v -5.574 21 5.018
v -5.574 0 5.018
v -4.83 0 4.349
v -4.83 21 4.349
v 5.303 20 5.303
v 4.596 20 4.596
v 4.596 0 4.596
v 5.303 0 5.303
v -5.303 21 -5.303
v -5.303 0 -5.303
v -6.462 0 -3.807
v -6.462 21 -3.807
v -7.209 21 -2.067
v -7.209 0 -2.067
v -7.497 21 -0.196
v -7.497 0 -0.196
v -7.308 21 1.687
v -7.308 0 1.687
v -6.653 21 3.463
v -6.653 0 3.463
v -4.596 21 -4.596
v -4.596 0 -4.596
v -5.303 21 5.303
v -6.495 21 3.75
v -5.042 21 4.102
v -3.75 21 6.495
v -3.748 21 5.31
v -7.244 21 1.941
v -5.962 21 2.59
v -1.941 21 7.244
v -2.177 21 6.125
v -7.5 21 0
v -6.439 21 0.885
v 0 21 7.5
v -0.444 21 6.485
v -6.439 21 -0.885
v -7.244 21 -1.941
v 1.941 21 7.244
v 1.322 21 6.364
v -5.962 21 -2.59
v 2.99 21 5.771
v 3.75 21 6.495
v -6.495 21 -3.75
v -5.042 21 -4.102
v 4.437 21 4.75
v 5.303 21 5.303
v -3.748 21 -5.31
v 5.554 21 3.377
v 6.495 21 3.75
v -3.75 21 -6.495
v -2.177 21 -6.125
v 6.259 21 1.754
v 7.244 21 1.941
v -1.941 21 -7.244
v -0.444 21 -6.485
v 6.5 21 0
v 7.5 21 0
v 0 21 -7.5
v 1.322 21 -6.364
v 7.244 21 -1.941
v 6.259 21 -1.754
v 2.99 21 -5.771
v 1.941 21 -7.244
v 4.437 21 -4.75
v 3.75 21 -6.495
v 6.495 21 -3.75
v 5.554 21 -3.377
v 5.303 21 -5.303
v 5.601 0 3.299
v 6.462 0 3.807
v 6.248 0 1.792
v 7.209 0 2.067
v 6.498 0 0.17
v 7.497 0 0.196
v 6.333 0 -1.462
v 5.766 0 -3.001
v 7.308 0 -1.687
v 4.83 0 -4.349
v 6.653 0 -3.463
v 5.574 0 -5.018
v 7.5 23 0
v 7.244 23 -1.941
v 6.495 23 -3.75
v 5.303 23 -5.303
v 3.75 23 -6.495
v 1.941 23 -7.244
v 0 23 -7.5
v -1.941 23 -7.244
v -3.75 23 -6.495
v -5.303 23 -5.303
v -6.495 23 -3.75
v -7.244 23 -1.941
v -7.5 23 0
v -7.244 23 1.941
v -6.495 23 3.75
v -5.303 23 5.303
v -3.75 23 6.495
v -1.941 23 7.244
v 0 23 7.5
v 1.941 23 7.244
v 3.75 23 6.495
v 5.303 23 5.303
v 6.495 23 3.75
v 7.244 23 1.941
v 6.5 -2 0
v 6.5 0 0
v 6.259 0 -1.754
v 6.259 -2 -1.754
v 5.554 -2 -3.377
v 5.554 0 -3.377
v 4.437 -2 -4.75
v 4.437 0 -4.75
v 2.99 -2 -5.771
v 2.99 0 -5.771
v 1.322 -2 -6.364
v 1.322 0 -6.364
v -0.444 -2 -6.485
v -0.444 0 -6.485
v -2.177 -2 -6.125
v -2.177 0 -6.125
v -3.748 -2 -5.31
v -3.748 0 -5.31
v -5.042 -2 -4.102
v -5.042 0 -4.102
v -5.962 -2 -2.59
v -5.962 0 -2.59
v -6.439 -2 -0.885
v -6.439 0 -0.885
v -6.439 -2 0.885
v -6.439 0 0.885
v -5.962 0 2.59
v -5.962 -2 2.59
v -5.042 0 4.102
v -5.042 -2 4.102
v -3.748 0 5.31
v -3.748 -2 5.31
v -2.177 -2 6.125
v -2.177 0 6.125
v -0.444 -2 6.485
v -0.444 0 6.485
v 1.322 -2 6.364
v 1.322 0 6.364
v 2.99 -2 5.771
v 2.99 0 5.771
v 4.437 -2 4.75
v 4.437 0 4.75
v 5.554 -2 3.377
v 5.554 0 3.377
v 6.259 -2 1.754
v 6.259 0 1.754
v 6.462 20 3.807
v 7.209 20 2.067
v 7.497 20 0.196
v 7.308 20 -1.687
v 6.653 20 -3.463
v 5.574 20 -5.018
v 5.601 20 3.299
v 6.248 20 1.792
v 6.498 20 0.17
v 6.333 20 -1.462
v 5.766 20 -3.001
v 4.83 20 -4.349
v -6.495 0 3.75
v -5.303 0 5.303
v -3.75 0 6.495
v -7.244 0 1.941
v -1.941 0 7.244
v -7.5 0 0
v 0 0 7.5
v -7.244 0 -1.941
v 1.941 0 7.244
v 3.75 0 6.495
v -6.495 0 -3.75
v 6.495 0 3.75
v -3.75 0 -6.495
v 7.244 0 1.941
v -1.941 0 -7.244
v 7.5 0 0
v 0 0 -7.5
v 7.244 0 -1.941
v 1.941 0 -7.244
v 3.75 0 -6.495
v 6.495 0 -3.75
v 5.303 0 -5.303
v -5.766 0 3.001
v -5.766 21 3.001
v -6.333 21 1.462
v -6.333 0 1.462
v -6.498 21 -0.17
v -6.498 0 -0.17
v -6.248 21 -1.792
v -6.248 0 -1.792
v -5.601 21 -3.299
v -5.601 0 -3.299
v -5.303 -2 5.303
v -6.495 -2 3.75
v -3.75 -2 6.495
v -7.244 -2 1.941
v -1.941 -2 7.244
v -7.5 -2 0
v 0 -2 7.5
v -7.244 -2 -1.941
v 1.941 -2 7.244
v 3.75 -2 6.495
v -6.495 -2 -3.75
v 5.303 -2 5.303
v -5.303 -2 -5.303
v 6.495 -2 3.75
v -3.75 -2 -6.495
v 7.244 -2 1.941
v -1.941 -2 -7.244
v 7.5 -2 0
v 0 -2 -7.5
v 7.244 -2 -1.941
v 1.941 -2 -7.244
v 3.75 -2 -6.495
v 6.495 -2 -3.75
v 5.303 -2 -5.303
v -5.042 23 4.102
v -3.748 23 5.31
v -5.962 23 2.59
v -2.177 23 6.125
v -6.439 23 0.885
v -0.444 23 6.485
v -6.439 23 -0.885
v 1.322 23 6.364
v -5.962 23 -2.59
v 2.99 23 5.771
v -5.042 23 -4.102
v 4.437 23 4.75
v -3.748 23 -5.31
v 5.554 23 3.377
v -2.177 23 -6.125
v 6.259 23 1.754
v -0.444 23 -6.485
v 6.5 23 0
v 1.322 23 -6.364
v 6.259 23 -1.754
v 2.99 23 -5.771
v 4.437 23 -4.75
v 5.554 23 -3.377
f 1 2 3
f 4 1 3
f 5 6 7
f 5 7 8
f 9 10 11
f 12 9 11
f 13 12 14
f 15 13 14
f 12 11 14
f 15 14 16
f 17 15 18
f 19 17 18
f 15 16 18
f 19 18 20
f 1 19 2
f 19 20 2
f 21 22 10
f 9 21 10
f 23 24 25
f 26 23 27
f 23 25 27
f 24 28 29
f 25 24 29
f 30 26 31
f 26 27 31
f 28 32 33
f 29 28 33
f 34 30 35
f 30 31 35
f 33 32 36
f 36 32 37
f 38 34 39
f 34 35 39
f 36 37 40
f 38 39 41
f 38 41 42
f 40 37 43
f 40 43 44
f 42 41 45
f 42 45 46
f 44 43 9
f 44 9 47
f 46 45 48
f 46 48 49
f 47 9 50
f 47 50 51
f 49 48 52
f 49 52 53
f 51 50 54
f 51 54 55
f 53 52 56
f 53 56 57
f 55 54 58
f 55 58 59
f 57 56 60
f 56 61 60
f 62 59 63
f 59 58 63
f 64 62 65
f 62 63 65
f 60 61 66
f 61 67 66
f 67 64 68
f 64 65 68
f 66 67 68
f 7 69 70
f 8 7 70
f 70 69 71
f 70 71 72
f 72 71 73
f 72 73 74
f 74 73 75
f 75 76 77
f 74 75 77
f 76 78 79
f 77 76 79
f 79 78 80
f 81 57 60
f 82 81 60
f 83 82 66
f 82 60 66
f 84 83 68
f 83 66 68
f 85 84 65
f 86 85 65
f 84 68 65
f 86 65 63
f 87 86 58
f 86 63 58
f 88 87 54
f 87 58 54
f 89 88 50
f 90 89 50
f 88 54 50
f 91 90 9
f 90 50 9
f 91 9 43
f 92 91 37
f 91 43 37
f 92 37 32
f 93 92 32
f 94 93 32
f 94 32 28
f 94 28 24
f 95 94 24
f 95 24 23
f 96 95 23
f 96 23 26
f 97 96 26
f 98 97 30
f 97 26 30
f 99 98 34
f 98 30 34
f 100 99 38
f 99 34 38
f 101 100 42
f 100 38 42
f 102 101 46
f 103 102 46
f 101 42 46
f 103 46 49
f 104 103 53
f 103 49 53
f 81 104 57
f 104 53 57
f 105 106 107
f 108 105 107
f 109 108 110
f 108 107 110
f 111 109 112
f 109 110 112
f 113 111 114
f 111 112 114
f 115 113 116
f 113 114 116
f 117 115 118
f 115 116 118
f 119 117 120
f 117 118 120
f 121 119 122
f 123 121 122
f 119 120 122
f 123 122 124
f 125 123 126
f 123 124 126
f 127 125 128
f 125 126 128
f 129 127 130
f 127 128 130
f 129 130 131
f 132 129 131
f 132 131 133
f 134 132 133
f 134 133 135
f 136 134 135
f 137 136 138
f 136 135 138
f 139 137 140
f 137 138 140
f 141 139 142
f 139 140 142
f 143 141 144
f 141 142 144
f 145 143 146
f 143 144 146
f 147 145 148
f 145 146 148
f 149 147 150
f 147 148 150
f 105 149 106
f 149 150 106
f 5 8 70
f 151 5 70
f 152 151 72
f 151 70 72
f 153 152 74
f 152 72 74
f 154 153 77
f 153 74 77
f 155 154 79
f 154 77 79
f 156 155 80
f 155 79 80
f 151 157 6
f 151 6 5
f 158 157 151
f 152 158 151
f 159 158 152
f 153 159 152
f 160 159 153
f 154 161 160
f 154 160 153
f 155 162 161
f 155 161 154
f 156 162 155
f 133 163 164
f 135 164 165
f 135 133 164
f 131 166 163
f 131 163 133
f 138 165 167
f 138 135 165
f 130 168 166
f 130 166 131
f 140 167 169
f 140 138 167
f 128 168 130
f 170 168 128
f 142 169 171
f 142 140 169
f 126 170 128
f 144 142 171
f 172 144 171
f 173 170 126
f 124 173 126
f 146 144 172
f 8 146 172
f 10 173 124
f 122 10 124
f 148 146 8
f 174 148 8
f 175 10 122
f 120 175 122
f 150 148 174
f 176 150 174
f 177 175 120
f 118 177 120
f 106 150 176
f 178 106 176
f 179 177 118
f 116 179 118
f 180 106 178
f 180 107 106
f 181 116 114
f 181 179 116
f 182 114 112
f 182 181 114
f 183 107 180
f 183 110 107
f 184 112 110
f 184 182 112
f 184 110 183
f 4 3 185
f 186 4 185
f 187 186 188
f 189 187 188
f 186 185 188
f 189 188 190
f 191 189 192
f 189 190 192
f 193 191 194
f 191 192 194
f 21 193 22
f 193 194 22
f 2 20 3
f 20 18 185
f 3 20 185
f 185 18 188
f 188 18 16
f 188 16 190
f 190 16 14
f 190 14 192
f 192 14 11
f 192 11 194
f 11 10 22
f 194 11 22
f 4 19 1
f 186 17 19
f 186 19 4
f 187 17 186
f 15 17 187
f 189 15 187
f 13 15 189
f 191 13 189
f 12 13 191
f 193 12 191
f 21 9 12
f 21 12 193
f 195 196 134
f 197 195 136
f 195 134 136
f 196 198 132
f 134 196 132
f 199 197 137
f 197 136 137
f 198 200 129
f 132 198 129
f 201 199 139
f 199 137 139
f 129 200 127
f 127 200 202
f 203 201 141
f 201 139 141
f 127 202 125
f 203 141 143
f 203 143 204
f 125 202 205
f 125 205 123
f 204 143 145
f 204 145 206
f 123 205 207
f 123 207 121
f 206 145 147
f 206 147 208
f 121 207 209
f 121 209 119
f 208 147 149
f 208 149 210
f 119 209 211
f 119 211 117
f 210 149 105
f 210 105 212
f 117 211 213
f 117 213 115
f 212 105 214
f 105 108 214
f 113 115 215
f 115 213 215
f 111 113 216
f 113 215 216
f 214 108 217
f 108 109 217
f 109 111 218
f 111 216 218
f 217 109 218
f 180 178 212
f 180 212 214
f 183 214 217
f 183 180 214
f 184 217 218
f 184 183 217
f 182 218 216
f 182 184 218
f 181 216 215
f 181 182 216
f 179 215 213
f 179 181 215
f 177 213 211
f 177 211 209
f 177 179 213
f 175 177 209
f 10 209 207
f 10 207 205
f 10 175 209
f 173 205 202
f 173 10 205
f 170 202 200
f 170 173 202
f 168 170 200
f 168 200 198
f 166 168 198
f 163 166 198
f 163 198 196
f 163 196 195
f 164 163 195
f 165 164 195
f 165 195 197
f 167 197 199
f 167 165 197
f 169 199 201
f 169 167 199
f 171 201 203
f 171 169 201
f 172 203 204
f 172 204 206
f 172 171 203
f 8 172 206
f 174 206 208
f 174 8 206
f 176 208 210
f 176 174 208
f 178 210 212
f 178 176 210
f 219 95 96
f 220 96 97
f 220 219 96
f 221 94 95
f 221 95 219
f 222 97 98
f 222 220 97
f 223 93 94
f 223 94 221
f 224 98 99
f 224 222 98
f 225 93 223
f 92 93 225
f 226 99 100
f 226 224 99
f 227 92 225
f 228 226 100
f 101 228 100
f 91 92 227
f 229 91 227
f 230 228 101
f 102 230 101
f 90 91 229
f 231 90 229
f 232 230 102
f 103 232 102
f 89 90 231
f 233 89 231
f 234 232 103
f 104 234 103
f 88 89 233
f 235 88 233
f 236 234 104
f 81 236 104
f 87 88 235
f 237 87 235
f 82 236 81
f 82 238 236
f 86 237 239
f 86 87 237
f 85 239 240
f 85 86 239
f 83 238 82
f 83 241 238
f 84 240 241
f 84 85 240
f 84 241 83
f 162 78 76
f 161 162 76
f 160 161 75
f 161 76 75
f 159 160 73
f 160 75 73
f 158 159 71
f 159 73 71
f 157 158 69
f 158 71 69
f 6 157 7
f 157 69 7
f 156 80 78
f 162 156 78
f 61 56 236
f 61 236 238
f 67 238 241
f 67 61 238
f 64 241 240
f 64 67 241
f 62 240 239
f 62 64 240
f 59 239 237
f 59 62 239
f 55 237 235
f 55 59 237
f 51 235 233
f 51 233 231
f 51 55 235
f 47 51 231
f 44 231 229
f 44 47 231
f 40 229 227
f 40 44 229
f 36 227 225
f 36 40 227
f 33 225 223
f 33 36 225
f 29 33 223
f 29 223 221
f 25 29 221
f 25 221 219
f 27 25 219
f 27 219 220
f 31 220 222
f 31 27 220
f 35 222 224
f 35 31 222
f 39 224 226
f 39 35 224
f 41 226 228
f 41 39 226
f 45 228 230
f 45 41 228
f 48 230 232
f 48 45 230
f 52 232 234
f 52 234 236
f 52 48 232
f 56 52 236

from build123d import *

# Parameters (mm, degrees)
EXTRUDE_THIN1_DEPTH     = 21
EXTRUDE_THIN1_2_DEPTH   = 21
SKETCH5_R               = 7.5
SKETCH5_R_2             = 6.5
EXTRUDE_THIN5_DEPTH     = 2
F_3DSKETCH3_R           = 7.5
F_3DSKETCH3_R_2         = 6.5
BOSS_EXTRUDE3_DEPTH     = 2
CUT_EXTRUDE1_DEPTH      = 26.327850284
CUT_EXTRUDE1_DEPTH_BACK = 1


with BuildPart() as part:
    # Sketch1 → Extrude-Thin1 (new body)
    with BuildSketch(Plane(origin=(0, 0, 0), x_dir=(1, 0, 0), z_dir=(0, 1, 0))):
        with BuildLine():
            ThreePointArc((-5.303300859, 5.303300859), (-7.497429937, 0.196327112), (-5.573586191, -5.018479548))
            Line((-5.573586191, -5.018479548), (-4.830441366, -4.349348941))
            ThreePointArc((-4.830441366, -4.349348941), (-6.497772612, 0.170150164), (-4.596194078, 4.596194078))
            Line((-4.596194078, 4.596194078), (-5.303300859, 5.303300859))
        make_face()
    extrude(amount=EXTRUDE_THIN1_DEPTH)


with BuildPart() as body_2:
    # Sketch1 → Extrude-Thin1 2 (new body)
    with BuildSketch(Plane(origin=(0, 0, 0), x_dir=(1, 0, 0), z_dir=(0, 1, 0))):
        with BuildLine():
            ThreePointArc((5.303300859, -5.303300859), (7.497429937, -0.196327112), (5.573586191, 5.018479548))
            Line((5.573586191, 5.018479548), (4.830441366, 4.349348941))
            ThreePointArc((4.830441366, 4.349348941), (6.497772612, -0.170150164), (4.596194078, -4.596194078))
            Line((4.596194078, -4.596194078), (5.303300859, -5.303300859))
        make_face()
    extrude(amount=EXTRUDE_THIN1_2_DEPTH)

    # Sketch12 → Cut-Extrude1 (cut, two sides: drawn at the far end of the back side and taken through both)
    with BuildSketch(Plane(origin=(0, 21, 0), x_dir=(1, 0, 0), z_dir=(0, 1, 0)).offset(-CUT_EXTRUDE1_DEPTH_BACK)):
        with BuildLine():
            Line((-24.753966258, 37.206162292), (4.830441366, 4.349348941))
            ThreePointArc((4.830441366, 4.349348941), (6.497772612, -0.170150164), (4.596194078, -4.596194078))
            Line((4.596194078, -4.596194078), (-26.66726189, -35.859650045))
            Line((-26.66726189, -35.859650045), (61.72884346, -38.174383527))
            Line((61.72884346, -38.174383527), (63.642139092, 34.891428811))
            Line((63.642139092, 34.891428811), (-24.753966258, 37.206162292))
        make_face()
    extrude(amount=CUT_EXTRUDE1_DEPTH + CUT_EXTRUDE1_DEPTH_BACK, mode=Mode.SUBTRACT)


with BuildPart() as body_3:
    # Sketch5 → Extrude-Thin5 (new body)
    with BuildSketch(Plane(origin=(0, 0, 0), x_dir=(1, 0, 0), z_dir=(0, 1, 0))):
        Circle(SKETCH5_R)
        Circle(SKETCH5_R_2, mode=Mode.SUBTRACT)
    extrude(amount=-EXTRUDE_THIN5_DEPTH)


with BuildPart() as body_4:
    # 3DSketch3 → Boss-Extrude3 (new body)
    with BuildSketch(Plane.ZX.offset(21)):
        Circle(F_3DSKETCH3_R)
        Circle(F_3DSKETCH3_R_2, mode=Mode.SUBTRACT)
    extrude(amount=BOSS_EXTRUDE3_DEPTH)


solid = Compound([part.part, body_2.part, body_3.part, body_4.part])
